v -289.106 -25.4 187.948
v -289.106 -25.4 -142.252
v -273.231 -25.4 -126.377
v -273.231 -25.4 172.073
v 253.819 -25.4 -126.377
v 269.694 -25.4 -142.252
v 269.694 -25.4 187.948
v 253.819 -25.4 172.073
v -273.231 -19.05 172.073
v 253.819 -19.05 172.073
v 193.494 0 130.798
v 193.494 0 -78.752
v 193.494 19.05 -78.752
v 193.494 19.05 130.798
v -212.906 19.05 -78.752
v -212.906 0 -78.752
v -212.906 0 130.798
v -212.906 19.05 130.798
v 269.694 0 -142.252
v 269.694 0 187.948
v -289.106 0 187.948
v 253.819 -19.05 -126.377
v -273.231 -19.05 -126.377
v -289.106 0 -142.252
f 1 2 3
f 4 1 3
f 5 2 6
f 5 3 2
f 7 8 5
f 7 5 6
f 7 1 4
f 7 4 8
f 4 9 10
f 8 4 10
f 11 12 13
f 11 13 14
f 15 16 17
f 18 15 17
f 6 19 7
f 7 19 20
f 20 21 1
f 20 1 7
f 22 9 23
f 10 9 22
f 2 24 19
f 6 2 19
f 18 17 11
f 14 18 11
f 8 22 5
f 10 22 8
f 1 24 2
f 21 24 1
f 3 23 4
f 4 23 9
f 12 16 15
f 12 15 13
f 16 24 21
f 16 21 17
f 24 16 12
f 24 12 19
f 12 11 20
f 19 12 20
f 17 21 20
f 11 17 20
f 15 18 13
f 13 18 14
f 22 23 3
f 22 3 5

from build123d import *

# Parameters (mm, degrees)
F0_W     = 558.8
F0_H     = 330.2
F0_W_2   = 527.05
F0_H_2   = 298.45
F1_DEPTH = 25.4
F2_DEPTH = 19.05
F3_W     = 406.4
F3_H     = 209.55
F4_DEPTH = 19.05


with BuildPart() as f1:
    # F0 (on Front) → F1 (new body)
    with BuildSketch(Plane.XZ):
        with Locations((-9.705722, 22.848336)):
            Rectangle(F0_W, F0_H)
        with Locations((-9.705722, 22.848336)):
            Rectangle(F0_W_2, F0_H_2, mode=Mode.SUBTRACT)
    extrude(amount=F1_DEPTH)

    # F0 (on Front) → F2 (join)
    with BuildSketch(Plane.XZ):
        with Locations((-9.705722, 22.848336)):
            Rectangle(F0_W_2, F0_H_2)
    extrude(amount=F2_DEPTH)

    # F3 (on face) → F4 (join)
    with BuildSketch(Plane.XZ):
        with Locations((-9.705722, 26.023336)):
            Rectangle(F3_W, F3_H)
    extrude(amount=-F4_DEPTH)


solid = f1.part
